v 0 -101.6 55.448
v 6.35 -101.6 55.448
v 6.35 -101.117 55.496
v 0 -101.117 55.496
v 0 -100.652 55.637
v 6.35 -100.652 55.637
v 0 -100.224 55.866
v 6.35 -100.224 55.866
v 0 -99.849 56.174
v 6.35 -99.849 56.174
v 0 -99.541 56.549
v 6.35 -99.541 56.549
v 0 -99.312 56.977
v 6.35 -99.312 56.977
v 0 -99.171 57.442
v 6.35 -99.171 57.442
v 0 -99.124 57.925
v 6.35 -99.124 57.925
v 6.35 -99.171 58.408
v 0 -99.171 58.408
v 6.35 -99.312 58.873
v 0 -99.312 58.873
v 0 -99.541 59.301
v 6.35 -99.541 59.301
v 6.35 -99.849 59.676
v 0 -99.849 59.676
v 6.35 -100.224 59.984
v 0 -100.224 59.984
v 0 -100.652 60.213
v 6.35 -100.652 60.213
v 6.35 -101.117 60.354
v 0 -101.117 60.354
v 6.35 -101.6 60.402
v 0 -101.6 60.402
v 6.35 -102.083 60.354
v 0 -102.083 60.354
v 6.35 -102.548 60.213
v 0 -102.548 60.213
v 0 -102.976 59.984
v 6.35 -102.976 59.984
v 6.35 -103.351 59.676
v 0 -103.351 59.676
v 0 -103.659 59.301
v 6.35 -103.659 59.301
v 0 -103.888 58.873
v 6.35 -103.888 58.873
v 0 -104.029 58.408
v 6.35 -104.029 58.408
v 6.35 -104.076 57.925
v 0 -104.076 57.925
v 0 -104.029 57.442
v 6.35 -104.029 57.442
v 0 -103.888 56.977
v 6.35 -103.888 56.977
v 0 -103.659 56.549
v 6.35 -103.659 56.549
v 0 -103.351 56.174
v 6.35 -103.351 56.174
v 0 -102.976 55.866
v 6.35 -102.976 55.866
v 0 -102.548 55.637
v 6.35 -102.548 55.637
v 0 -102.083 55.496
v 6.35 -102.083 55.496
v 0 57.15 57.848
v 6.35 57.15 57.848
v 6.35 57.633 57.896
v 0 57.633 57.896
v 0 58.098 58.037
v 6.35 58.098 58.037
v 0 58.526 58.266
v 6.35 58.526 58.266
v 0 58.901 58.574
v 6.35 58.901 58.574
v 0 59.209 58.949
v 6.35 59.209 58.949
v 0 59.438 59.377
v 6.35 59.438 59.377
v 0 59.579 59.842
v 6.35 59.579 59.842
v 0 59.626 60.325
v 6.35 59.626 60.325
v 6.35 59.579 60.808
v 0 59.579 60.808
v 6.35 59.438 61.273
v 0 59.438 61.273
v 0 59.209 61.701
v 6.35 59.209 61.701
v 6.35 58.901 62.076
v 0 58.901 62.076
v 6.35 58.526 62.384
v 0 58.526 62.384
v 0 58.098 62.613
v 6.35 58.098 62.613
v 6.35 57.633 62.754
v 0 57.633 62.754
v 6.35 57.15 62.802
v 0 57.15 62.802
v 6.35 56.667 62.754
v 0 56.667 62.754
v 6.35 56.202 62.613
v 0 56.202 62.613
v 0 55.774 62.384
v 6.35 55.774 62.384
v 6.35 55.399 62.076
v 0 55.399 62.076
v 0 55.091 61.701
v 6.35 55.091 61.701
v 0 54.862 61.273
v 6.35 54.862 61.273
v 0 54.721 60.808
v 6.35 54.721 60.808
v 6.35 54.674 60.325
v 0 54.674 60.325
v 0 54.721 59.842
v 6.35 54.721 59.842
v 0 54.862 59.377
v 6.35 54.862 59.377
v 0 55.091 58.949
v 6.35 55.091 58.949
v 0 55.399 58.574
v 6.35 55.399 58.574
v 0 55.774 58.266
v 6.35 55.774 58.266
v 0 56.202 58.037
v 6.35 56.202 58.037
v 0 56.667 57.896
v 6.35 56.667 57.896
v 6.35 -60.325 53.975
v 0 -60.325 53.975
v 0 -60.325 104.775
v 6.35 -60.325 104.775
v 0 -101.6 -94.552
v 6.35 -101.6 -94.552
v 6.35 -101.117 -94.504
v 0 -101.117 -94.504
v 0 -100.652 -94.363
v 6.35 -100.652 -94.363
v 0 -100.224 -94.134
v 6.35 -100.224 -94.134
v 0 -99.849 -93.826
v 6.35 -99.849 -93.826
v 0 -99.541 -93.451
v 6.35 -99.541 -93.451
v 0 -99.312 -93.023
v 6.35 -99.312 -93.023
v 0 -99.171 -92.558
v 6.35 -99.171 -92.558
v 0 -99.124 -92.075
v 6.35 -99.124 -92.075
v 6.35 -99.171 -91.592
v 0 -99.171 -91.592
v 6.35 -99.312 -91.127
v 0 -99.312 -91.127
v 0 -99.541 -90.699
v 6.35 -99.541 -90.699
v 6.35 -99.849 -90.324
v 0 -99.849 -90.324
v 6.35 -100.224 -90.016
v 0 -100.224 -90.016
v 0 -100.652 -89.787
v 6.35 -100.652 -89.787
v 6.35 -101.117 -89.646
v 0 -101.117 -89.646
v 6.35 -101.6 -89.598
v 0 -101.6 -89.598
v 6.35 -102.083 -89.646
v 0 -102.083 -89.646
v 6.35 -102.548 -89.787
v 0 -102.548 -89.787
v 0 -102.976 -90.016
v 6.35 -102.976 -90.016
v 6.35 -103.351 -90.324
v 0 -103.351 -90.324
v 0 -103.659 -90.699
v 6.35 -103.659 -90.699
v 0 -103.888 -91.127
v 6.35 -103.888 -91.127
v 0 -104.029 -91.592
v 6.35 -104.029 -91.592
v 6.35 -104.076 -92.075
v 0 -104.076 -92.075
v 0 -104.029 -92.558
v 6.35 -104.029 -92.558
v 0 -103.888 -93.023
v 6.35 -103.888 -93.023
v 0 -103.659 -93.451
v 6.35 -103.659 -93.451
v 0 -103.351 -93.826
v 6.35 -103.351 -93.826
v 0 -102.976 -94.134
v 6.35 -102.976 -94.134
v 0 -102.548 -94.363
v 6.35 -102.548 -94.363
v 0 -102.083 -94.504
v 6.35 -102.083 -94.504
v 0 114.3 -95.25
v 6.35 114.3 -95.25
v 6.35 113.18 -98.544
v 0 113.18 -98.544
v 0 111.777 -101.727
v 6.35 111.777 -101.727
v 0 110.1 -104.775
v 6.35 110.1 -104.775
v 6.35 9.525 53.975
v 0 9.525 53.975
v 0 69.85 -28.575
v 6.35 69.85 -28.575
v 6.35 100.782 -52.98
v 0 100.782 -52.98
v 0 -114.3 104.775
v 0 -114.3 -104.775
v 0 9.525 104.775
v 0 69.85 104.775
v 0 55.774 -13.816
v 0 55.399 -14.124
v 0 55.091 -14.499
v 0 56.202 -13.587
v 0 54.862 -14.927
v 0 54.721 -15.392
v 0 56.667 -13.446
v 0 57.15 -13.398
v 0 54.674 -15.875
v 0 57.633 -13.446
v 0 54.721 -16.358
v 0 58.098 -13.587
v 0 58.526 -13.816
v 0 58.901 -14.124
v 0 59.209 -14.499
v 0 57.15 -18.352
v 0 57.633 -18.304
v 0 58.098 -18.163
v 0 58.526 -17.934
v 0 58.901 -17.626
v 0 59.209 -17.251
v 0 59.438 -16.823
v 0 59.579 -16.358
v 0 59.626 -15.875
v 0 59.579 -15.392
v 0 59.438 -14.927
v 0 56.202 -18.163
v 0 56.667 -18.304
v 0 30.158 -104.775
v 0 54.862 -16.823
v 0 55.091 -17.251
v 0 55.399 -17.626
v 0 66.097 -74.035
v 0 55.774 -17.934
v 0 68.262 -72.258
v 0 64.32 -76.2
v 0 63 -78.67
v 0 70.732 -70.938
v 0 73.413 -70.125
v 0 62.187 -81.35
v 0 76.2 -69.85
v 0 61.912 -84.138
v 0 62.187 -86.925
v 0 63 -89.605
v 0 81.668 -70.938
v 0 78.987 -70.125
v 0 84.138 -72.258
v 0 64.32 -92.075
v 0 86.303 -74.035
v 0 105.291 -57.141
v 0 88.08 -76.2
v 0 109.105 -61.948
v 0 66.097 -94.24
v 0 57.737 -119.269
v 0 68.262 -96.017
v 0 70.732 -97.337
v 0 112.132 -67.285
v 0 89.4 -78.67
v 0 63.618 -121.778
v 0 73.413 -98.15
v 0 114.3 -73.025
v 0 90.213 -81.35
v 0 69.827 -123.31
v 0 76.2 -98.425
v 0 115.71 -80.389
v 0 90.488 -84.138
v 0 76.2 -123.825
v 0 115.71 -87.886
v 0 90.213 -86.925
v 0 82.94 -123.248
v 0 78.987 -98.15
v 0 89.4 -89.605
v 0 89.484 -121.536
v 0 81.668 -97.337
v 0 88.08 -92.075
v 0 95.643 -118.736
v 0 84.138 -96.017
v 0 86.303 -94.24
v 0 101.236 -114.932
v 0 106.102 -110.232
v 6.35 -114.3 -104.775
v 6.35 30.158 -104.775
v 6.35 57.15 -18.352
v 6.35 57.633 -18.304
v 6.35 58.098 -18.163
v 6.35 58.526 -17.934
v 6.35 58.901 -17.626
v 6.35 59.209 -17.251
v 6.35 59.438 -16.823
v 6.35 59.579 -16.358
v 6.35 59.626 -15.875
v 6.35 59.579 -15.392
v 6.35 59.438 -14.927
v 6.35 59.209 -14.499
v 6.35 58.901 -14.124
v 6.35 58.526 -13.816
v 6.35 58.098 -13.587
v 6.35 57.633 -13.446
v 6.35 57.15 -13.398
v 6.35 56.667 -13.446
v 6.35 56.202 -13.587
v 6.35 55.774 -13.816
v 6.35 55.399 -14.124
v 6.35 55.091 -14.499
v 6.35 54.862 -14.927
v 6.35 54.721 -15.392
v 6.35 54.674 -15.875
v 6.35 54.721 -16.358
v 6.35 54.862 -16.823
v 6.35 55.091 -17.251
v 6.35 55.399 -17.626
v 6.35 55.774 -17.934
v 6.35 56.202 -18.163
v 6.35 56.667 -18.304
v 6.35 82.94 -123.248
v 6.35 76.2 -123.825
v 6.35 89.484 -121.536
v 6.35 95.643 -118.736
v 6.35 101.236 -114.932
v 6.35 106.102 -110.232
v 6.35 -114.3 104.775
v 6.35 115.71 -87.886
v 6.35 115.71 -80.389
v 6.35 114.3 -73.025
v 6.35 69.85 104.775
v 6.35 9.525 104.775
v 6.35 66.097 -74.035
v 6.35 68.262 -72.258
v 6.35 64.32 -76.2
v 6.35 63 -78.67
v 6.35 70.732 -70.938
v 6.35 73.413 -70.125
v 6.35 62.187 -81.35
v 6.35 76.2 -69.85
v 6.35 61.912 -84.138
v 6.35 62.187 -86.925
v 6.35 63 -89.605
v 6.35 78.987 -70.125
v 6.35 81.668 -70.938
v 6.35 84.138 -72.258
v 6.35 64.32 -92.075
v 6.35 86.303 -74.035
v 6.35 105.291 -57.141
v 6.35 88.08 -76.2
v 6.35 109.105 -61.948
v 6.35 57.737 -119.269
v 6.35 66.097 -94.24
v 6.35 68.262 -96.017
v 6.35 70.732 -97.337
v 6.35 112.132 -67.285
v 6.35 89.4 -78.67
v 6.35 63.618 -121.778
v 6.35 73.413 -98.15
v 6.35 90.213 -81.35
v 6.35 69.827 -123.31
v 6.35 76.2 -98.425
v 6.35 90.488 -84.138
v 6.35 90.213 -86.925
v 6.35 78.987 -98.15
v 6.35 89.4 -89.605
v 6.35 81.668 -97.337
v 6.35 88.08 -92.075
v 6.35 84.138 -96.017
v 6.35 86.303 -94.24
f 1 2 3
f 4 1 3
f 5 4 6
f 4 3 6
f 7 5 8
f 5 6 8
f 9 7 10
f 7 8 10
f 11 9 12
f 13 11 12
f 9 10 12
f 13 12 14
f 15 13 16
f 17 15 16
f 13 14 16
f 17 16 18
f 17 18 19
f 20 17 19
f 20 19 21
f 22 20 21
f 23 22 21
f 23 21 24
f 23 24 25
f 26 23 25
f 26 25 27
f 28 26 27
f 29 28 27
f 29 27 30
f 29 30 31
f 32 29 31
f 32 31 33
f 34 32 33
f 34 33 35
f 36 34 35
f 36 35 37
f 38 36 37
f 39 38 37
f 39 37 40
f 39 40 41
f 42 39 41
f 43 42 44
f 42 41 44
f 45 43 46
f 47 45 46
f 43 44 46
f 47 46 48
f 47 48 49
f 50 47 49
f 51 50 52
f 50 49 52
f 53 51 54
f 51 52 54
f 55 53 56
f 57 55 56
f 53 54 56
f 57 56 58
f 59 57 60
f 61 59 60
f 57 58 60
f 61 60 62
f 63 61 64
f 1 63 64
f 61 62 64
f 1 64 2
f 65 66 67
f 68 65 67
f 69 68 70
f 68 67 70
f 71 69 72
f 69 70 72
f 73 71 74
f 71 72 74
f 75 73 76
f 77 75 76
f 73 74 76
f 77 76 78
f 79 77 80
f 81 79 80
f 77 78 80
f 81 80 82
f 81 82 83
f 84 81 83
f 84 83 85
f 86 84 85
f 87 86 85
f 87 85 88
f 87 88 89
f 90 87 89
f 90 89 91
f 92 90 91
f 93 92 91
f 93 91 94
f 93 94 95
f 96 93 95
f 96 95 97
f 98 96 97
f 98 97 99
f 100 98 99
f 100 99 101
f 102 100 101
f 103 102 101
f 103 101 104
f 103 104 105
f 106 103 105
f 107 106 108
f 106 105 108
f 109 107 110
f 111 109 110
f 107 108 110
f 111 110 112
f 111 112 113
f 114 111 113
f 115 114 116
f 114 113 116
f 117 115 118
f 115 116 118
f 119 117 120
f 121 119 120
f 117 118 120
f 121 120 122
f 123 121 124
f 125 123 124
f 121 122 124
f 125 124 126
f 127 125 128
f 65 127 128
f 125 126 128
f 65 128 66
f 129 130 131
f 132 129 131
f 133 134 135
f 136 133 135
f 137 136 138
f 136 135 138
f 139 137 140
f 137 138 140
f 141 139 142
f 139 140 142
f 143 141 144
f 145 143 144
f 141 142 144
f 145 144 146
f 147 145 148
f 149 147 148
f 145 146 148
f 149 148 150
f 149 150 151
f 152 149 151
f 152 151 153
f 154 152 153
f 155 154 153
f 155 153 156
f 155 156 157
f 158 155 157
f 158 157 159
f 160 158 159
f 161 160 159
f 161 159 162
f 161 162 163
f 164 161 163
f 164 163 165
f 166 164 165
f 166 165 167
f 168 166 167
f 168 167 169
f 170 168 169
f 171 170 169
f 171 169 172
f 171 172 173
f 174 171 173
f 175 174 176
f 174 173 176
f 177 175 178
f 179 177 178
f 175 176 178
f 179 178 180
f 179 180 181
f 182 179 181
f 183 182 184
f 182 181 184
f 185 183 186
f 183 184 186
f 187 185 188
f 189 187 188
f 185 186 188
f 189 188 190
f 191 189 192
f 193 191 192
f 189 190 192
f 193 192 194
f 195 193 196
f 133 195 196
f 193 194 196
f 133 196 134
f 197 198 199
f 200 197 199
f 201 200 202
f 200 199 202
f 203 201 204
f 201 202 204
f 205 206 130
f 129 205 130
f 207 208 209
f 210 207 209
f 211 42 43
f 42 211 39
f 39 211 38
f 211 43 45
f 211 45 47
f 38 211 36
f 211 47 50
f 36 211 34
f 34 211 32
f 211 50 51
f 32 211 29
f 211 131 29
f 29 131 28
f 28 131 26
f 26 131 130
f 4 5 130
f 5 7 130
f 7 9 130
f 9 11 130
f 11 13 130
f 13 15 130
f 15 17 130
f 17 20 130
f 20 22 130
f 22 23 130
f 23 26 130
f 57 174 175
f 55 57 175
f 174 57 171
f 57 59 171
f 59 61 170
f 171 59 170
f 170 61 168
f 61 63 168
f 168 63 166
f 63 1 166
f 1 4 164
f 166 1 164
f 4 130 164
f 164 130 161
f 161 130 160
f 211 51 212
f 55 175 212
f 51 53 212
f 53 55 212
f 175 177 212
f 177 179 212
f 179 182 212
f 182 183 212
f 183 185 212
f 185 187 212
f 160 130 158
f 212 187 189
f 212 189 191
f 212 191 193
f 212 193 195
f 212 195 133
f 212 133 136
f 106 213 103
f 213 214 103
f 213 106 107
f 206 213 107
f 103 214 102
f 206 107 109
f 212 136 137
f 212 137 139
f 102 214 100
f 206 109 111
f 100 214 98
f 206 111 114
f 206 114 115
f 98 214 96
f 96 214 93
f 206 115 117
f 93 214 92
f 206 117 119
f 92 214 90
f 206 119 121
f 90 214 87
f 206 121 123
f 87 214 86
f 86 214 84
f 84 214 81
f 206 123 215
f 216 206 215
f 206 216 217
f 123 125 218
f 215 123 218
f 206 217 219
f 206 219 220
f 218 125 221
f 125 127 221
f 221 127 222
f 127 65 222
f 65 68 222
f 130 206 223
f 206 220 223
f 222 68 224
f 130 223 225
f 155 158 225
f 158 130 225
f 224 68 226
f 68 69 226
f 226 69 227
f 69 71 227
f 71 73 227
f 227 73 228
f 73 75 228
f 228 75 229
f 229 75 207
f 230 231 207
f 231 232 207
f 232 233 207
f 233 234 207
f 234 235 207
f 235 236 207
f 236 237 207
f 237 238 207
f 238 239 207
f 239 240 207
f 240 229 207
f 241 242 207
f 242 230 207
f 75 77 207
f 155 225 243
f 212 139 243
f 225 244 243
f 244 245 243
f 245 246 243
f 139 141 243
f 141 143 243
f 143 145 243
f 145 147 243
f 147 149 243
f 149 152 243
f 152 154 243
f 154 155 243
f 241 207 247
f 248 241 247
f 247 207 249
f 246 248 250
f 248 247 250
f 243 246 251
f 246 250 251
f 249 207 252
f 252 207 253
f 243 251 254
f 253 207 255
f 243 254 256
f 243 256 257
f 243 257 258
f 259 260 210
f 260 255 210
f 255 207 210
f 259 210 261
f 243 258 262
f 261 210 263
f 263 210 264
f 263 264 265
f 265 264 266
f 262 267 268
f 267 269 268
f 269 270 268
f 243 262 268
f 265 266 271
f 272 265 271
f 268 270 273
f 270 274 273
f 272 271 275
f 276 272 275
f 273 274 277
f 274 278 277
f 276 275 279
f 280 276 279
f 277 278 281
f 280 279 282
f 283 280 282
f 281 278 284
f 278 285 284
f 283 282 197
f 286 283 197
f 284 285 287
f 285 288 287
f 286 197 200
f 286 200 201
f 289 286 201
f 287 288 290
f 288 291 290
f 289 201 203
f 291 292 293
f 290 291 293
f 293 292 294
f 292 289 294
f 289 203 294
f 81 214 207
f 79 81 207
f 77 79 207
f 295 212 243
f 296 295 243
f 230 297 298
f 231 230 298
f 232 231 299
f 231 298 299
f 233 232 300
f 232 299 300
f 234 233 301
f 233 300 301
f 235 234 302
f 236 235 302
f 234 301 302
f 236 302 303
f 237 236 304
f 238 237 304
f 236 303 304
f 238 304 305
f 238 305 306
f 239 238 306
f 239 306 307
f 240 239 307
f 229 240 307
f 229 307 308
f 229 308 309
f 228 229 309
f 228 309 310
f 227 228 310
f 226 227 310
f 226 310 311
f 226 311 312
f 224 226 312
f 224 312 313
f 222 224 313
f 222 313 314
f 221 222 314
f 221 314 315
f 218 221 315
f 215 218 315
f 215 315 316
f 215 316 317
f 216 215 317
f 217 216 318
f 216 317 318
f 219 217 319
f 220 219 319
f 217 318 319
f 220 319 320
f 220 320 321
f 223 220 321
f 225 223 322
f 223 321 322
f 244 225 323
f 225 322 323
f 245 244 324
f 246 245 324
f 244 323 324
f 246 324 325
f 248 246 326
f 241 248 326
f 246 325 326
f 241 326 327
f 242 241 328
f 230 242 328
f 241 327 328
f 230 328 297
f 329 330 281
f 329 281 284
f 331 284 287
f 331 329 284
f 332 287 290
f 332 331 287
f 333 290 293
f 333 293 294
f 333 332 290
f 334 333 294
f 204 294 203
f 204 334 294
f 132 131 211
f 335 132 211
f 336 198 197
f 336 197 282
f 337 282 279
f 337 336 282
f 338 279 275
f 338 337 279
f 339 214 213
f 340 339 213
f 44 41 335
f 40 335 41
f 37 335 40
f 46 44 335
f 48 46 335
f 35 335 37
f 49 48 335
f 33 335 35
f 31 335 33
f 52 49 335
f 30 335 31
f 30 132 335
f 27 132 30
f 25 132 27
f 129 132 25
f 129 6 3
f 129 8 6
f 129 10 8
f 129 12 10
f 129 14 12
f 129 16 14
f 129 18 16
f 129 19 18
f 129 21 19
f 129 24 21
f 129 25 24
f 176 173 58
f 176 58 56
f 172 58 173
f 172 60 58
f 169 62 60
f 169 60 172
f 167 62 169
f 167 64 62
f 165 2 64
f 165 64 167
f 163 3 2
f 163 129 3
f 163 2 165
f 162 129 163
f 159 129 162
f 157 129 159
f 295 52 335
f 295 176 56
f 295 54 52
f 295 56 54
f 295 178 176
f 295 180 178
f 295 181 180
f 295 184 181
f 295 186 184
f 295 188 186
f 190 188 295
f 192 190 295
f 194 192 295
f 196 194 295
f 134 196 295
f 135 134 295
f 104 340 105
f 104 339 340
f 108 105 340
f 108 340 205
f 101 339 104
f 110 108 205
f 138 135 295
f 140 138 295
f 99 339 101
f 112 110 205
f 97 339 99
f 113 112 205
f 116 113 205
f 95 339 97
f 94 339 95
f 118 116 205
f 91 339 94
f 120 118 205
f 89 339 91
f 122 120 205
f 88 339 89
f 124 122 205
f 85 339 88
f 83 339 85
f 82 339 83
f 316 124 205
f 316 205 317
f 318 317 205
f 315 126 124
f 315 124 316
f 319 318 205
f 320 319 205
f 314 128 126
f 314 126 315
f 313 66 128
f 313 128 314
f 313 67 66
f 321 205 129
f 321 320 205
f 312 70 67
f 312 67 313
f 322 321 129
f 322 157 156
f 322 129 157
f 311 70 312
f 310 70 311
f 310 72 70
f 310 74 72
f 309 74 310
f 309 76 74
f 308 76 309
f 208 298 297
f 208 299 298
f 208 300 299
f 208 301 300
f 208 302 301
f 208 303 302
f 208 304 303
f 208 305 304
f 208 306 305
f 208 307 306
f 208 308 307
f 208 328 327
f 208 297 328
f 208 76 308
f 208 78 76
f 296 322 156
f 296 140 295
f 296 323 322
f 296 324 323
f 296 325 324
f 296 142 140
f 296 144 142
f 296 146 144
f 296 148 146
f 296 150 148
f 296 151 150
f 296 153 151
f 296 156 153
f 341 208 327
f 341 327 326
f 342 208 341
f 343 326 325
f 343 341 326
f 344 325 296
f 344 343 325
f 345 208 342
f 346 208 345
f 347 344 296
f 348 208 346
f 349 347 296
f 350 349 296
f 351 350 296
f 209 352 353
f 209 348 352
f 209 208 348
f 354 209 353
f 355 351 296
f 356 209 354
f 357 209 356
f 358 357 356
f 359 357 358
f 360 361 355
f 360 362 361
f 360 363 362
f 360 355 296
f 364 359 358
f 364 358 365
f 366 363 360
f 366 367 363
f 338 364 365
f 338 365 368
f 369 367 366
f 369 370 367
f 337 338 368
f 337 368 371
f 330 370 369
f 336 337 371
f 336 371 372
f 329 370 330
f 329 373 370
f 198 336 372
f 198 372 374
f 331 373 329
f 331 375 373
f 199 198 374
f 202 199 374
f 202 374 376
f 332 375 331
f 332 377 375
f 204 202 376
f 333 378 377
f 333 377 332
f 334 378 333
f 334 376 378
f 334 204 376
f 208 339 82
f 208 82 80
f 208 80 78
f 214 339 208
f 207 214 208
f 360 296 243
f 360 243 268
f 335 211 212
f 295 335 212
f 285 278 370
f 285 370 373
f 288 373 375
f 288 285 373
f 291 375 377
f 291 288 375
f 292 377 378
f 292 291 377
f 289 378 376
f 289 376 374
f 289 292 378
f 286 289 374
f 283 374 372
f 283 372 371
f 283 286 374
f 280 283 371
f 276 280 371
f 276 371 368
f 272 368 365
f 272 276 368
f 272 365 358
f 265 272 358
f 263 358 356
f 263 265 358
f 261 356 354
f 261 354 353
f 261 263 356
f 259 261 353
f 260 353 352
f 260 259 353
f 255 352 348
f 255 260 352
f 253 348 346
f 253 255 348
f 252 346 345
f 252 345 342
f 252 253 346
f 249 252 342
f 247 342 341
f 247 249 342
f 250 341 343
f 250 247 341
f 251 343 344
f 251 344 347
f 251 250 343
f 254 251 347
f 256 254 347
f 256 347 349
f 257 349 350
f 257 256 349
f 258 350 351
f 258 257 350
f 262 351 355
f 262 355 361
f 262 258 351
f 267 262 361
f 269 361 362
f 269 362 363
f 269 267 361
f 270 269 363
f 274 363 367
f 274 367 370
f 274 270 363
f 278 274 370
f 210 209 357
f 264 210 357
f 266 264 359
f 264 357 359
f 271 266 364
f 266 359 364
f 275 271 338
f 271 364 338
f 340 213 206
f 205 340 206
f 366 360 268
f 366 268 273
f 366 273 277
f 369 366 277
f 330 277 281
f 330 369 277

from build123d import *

# Parameters (mm, degrees)
SKETCH1_R               = 14.2875
BOSS_EXTRUDE1_DEPTH     = 6.35
SKETCH2_W               = 133.35
SKETCH2_H               = 44.45
CUT_EXTRUDE1_DEPTH      = 7.35
CUT_EXTRUDE2_DEPTH      = 7.35
BOSS_EXTRUDE2_DEPTH     = 6.35
SKETCH4_R               = 2.4765
CUT_EXTRUDE3_DEPTH      = 2.54
CUT_EXTRUDE3_DEPTH_BACK = 7.35


with BuildPart() as part:
    # Sketch1 → Boss-Extrude1 (new body)
    with BuildSketch(Plane(origin=(0, 0, 0), x_dir=(0, 0, -1), z_dir=(1, 0, 0))):
        Polygon((-104.775, -60.325), (-104.775, -114.3), (104.775, -114.3), (104.775, 114.3), (-104.775, 114.3), (-104.775, 9.525), (-53.975, 9.525), (-53.975, -60.325), align=None)
        with Locations((84.1375, 76.2)):
            Circle(SKETCH1_R, mode=Mode.SUBTRACT)
    extrude(amount=BOSS_EXTRUDE1_DEPTH)

    # Sketch2 → Cut-Extrude1 (cut, through all)
    with BuildSketch(Plane(origin=(6.35, 0, 0), x_dir=(0, 0, -1), z_dir=(1, 0, 0))):
        with Locations((-38.1, 92.075)):
            Rectangle(SKETCH2_W, SKETCH2_H)
    extrude(amount=-CUT_EXTRUDE1_DEPTH, mode=Mode.SUBTRACT)

    # Sketch3 → Cut-Extrude2 (cut, through all)
    with BuildSketch(Plane(origin=(6.35, 0, 0), x_dir=(0, 0, -1), z_dir=(1, 0, 0))):
        with BuildLine():
            Line((28.575, 114.3), (28.575, 69.85))
            Line((28.575, 69.85), (52.979857871, 100.782493632))
            ThreePointArc((52.979857871, 100.782493632), (61.948043641, 109.10479726), (73.025, 114.3))
            Line((73.025, 114.3), (28.575, 114.3))
        make_face()
        with BuildLine():
            Line((104.775, 114.3), (95.25, 114.3))
            ThreePointArc((95.25, 114.3), (100.150813391, 112.513516085), (104.775, 110.09972345))
            Line((104.775, 110.09972345), (104.775, 114.3))
        make_face()
    extrude(amount=-CUT_EXTRUDE2_DEPTH, mode=Mode.SUBTRACT)

    # Sketch3<3> → Boss-Extrude2 (add)
    with BuildSketch(Plane(origin=(6.35, 0, 0), x_dir=(0, 0, -1), z_dir=(1, 0, 0))):
        with BuildLine():
            ThreePointArc((119.268927195, 57.73705117), (113.070471033, 49.034197169), (104.775, 42.30027655))
            Line((104.775, 42.30027655), (104.775, 30.157905893))
            Line((104.775, 30.157905893), (119.268927195, 57.73705117))
        make_face()
        with BuildLine():
            Line((104.775, 110.09972345), (104.775, 42.30027655))
            ThreePointArc((104.775, 42.30027655), (113.070471033, 49.034197169), (119.268927195, 57.73705117))
            ThreePointArc((119.268927195, 57.73705117), (122.669150452, 66.691605303), (123.825, 76.2))
            ThreePointArc((123.825, 76.2), (118.736260364, 95.642824833), (104.775, 110.09972345))
        make_face()
        with BuildLine():
            ThreePointArc((95.25, 114.3), (84.1375, 115.8875), (73.025, 114.3))
            Line((73.025, 114.3), (95.25, 114.3))
        make_face()
    extrude(amount=-BOSS_EXTRUDE2_DEPTH)

    # Sketch4 → Cut-Extrude3 (cut, two sides)
    with BuildSketch(Plane(origin=(6.35, 0, 0), x_dir=(0, 0, -1), z_dir=(1, 0, 0))) as cut_extrude3_sk:
        with Locations((-60.325, 57.15)):
            Circle(SKETCH4_R)
        with Locations((15.875, 57.15)):
            Circle(SKETCH4_R)
        with Locations((92.075, -101.6)):
            Circle(SKETCH4_R)
        with Locations((-57.925, -101.6)):
            Circle(SKETCH4_R)
    extrude(amount=CUT_EXTRUDE3_DEPTH, mode=Mode.SUBTRACT)
    extrude(cut_extrude3_sk.sketch, amount=-CUT_EXTRUDE3_DEPTH_BACK, mode=Mode.SUBTRACT)


solid = part.part
